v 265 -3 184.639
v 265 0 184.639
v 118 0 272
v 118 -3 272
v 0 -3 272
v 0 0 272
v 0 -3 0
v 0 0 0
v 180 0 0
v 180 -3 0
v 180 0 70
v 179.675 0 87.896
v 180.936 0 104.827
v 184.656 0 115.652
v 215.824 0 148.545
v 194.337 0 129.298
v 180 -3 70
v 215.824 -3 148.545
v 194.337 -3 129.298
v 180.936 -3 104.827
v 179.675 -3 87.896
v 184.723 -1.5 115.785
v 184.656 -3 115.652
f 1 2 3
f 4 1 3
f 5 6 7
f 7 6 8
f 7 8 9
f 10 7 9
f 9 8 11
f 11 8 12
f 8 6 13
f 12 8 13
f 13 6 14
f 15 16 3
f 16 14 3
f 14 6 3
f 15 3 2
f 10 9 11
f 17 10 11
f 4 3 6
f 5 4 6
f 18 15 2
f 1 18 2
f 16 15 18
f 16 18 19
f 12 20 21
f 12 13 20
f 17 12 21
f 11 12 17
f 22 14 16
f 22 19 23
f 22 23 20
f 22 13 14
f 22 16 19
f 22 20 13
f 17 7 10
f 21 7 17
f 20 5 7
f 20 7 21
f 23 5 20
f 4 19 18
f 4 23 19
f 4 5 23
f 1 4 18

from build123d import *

# Parameters (mm, degrees)
F1_DEPTH = 3


with BuildPart() as f1:
    # F0 (on Front) → F1 (new body)
    with BuildSketch(Plane.XZ):
        with BuildLine():
            Line((0, 272), (0, 0))
            Line((0, 0), (180, 0))
            Line((180, 0), (180, 70))
            add(Edge.make_bspline(
                [(215.824013933, 148.5454355016), (208.91407131, 143.3580070922), (174.748380555, 116.4051533787), (180.2117525716, 86.4379331497), (180, 70)],
                knots=[0, 0, 0, 0, 0.4976525843, 1, 1, 1, 1], degree=3))
            Line((215.824013933, 148.5454355016), (265, 184.6386813286))
            Line((265, 184.6386813286), (118, 272))
            Line((118, 272), (0, 272))
        make_face()
    extrude(amount=F1_DEPTH)


solid = f1.part
